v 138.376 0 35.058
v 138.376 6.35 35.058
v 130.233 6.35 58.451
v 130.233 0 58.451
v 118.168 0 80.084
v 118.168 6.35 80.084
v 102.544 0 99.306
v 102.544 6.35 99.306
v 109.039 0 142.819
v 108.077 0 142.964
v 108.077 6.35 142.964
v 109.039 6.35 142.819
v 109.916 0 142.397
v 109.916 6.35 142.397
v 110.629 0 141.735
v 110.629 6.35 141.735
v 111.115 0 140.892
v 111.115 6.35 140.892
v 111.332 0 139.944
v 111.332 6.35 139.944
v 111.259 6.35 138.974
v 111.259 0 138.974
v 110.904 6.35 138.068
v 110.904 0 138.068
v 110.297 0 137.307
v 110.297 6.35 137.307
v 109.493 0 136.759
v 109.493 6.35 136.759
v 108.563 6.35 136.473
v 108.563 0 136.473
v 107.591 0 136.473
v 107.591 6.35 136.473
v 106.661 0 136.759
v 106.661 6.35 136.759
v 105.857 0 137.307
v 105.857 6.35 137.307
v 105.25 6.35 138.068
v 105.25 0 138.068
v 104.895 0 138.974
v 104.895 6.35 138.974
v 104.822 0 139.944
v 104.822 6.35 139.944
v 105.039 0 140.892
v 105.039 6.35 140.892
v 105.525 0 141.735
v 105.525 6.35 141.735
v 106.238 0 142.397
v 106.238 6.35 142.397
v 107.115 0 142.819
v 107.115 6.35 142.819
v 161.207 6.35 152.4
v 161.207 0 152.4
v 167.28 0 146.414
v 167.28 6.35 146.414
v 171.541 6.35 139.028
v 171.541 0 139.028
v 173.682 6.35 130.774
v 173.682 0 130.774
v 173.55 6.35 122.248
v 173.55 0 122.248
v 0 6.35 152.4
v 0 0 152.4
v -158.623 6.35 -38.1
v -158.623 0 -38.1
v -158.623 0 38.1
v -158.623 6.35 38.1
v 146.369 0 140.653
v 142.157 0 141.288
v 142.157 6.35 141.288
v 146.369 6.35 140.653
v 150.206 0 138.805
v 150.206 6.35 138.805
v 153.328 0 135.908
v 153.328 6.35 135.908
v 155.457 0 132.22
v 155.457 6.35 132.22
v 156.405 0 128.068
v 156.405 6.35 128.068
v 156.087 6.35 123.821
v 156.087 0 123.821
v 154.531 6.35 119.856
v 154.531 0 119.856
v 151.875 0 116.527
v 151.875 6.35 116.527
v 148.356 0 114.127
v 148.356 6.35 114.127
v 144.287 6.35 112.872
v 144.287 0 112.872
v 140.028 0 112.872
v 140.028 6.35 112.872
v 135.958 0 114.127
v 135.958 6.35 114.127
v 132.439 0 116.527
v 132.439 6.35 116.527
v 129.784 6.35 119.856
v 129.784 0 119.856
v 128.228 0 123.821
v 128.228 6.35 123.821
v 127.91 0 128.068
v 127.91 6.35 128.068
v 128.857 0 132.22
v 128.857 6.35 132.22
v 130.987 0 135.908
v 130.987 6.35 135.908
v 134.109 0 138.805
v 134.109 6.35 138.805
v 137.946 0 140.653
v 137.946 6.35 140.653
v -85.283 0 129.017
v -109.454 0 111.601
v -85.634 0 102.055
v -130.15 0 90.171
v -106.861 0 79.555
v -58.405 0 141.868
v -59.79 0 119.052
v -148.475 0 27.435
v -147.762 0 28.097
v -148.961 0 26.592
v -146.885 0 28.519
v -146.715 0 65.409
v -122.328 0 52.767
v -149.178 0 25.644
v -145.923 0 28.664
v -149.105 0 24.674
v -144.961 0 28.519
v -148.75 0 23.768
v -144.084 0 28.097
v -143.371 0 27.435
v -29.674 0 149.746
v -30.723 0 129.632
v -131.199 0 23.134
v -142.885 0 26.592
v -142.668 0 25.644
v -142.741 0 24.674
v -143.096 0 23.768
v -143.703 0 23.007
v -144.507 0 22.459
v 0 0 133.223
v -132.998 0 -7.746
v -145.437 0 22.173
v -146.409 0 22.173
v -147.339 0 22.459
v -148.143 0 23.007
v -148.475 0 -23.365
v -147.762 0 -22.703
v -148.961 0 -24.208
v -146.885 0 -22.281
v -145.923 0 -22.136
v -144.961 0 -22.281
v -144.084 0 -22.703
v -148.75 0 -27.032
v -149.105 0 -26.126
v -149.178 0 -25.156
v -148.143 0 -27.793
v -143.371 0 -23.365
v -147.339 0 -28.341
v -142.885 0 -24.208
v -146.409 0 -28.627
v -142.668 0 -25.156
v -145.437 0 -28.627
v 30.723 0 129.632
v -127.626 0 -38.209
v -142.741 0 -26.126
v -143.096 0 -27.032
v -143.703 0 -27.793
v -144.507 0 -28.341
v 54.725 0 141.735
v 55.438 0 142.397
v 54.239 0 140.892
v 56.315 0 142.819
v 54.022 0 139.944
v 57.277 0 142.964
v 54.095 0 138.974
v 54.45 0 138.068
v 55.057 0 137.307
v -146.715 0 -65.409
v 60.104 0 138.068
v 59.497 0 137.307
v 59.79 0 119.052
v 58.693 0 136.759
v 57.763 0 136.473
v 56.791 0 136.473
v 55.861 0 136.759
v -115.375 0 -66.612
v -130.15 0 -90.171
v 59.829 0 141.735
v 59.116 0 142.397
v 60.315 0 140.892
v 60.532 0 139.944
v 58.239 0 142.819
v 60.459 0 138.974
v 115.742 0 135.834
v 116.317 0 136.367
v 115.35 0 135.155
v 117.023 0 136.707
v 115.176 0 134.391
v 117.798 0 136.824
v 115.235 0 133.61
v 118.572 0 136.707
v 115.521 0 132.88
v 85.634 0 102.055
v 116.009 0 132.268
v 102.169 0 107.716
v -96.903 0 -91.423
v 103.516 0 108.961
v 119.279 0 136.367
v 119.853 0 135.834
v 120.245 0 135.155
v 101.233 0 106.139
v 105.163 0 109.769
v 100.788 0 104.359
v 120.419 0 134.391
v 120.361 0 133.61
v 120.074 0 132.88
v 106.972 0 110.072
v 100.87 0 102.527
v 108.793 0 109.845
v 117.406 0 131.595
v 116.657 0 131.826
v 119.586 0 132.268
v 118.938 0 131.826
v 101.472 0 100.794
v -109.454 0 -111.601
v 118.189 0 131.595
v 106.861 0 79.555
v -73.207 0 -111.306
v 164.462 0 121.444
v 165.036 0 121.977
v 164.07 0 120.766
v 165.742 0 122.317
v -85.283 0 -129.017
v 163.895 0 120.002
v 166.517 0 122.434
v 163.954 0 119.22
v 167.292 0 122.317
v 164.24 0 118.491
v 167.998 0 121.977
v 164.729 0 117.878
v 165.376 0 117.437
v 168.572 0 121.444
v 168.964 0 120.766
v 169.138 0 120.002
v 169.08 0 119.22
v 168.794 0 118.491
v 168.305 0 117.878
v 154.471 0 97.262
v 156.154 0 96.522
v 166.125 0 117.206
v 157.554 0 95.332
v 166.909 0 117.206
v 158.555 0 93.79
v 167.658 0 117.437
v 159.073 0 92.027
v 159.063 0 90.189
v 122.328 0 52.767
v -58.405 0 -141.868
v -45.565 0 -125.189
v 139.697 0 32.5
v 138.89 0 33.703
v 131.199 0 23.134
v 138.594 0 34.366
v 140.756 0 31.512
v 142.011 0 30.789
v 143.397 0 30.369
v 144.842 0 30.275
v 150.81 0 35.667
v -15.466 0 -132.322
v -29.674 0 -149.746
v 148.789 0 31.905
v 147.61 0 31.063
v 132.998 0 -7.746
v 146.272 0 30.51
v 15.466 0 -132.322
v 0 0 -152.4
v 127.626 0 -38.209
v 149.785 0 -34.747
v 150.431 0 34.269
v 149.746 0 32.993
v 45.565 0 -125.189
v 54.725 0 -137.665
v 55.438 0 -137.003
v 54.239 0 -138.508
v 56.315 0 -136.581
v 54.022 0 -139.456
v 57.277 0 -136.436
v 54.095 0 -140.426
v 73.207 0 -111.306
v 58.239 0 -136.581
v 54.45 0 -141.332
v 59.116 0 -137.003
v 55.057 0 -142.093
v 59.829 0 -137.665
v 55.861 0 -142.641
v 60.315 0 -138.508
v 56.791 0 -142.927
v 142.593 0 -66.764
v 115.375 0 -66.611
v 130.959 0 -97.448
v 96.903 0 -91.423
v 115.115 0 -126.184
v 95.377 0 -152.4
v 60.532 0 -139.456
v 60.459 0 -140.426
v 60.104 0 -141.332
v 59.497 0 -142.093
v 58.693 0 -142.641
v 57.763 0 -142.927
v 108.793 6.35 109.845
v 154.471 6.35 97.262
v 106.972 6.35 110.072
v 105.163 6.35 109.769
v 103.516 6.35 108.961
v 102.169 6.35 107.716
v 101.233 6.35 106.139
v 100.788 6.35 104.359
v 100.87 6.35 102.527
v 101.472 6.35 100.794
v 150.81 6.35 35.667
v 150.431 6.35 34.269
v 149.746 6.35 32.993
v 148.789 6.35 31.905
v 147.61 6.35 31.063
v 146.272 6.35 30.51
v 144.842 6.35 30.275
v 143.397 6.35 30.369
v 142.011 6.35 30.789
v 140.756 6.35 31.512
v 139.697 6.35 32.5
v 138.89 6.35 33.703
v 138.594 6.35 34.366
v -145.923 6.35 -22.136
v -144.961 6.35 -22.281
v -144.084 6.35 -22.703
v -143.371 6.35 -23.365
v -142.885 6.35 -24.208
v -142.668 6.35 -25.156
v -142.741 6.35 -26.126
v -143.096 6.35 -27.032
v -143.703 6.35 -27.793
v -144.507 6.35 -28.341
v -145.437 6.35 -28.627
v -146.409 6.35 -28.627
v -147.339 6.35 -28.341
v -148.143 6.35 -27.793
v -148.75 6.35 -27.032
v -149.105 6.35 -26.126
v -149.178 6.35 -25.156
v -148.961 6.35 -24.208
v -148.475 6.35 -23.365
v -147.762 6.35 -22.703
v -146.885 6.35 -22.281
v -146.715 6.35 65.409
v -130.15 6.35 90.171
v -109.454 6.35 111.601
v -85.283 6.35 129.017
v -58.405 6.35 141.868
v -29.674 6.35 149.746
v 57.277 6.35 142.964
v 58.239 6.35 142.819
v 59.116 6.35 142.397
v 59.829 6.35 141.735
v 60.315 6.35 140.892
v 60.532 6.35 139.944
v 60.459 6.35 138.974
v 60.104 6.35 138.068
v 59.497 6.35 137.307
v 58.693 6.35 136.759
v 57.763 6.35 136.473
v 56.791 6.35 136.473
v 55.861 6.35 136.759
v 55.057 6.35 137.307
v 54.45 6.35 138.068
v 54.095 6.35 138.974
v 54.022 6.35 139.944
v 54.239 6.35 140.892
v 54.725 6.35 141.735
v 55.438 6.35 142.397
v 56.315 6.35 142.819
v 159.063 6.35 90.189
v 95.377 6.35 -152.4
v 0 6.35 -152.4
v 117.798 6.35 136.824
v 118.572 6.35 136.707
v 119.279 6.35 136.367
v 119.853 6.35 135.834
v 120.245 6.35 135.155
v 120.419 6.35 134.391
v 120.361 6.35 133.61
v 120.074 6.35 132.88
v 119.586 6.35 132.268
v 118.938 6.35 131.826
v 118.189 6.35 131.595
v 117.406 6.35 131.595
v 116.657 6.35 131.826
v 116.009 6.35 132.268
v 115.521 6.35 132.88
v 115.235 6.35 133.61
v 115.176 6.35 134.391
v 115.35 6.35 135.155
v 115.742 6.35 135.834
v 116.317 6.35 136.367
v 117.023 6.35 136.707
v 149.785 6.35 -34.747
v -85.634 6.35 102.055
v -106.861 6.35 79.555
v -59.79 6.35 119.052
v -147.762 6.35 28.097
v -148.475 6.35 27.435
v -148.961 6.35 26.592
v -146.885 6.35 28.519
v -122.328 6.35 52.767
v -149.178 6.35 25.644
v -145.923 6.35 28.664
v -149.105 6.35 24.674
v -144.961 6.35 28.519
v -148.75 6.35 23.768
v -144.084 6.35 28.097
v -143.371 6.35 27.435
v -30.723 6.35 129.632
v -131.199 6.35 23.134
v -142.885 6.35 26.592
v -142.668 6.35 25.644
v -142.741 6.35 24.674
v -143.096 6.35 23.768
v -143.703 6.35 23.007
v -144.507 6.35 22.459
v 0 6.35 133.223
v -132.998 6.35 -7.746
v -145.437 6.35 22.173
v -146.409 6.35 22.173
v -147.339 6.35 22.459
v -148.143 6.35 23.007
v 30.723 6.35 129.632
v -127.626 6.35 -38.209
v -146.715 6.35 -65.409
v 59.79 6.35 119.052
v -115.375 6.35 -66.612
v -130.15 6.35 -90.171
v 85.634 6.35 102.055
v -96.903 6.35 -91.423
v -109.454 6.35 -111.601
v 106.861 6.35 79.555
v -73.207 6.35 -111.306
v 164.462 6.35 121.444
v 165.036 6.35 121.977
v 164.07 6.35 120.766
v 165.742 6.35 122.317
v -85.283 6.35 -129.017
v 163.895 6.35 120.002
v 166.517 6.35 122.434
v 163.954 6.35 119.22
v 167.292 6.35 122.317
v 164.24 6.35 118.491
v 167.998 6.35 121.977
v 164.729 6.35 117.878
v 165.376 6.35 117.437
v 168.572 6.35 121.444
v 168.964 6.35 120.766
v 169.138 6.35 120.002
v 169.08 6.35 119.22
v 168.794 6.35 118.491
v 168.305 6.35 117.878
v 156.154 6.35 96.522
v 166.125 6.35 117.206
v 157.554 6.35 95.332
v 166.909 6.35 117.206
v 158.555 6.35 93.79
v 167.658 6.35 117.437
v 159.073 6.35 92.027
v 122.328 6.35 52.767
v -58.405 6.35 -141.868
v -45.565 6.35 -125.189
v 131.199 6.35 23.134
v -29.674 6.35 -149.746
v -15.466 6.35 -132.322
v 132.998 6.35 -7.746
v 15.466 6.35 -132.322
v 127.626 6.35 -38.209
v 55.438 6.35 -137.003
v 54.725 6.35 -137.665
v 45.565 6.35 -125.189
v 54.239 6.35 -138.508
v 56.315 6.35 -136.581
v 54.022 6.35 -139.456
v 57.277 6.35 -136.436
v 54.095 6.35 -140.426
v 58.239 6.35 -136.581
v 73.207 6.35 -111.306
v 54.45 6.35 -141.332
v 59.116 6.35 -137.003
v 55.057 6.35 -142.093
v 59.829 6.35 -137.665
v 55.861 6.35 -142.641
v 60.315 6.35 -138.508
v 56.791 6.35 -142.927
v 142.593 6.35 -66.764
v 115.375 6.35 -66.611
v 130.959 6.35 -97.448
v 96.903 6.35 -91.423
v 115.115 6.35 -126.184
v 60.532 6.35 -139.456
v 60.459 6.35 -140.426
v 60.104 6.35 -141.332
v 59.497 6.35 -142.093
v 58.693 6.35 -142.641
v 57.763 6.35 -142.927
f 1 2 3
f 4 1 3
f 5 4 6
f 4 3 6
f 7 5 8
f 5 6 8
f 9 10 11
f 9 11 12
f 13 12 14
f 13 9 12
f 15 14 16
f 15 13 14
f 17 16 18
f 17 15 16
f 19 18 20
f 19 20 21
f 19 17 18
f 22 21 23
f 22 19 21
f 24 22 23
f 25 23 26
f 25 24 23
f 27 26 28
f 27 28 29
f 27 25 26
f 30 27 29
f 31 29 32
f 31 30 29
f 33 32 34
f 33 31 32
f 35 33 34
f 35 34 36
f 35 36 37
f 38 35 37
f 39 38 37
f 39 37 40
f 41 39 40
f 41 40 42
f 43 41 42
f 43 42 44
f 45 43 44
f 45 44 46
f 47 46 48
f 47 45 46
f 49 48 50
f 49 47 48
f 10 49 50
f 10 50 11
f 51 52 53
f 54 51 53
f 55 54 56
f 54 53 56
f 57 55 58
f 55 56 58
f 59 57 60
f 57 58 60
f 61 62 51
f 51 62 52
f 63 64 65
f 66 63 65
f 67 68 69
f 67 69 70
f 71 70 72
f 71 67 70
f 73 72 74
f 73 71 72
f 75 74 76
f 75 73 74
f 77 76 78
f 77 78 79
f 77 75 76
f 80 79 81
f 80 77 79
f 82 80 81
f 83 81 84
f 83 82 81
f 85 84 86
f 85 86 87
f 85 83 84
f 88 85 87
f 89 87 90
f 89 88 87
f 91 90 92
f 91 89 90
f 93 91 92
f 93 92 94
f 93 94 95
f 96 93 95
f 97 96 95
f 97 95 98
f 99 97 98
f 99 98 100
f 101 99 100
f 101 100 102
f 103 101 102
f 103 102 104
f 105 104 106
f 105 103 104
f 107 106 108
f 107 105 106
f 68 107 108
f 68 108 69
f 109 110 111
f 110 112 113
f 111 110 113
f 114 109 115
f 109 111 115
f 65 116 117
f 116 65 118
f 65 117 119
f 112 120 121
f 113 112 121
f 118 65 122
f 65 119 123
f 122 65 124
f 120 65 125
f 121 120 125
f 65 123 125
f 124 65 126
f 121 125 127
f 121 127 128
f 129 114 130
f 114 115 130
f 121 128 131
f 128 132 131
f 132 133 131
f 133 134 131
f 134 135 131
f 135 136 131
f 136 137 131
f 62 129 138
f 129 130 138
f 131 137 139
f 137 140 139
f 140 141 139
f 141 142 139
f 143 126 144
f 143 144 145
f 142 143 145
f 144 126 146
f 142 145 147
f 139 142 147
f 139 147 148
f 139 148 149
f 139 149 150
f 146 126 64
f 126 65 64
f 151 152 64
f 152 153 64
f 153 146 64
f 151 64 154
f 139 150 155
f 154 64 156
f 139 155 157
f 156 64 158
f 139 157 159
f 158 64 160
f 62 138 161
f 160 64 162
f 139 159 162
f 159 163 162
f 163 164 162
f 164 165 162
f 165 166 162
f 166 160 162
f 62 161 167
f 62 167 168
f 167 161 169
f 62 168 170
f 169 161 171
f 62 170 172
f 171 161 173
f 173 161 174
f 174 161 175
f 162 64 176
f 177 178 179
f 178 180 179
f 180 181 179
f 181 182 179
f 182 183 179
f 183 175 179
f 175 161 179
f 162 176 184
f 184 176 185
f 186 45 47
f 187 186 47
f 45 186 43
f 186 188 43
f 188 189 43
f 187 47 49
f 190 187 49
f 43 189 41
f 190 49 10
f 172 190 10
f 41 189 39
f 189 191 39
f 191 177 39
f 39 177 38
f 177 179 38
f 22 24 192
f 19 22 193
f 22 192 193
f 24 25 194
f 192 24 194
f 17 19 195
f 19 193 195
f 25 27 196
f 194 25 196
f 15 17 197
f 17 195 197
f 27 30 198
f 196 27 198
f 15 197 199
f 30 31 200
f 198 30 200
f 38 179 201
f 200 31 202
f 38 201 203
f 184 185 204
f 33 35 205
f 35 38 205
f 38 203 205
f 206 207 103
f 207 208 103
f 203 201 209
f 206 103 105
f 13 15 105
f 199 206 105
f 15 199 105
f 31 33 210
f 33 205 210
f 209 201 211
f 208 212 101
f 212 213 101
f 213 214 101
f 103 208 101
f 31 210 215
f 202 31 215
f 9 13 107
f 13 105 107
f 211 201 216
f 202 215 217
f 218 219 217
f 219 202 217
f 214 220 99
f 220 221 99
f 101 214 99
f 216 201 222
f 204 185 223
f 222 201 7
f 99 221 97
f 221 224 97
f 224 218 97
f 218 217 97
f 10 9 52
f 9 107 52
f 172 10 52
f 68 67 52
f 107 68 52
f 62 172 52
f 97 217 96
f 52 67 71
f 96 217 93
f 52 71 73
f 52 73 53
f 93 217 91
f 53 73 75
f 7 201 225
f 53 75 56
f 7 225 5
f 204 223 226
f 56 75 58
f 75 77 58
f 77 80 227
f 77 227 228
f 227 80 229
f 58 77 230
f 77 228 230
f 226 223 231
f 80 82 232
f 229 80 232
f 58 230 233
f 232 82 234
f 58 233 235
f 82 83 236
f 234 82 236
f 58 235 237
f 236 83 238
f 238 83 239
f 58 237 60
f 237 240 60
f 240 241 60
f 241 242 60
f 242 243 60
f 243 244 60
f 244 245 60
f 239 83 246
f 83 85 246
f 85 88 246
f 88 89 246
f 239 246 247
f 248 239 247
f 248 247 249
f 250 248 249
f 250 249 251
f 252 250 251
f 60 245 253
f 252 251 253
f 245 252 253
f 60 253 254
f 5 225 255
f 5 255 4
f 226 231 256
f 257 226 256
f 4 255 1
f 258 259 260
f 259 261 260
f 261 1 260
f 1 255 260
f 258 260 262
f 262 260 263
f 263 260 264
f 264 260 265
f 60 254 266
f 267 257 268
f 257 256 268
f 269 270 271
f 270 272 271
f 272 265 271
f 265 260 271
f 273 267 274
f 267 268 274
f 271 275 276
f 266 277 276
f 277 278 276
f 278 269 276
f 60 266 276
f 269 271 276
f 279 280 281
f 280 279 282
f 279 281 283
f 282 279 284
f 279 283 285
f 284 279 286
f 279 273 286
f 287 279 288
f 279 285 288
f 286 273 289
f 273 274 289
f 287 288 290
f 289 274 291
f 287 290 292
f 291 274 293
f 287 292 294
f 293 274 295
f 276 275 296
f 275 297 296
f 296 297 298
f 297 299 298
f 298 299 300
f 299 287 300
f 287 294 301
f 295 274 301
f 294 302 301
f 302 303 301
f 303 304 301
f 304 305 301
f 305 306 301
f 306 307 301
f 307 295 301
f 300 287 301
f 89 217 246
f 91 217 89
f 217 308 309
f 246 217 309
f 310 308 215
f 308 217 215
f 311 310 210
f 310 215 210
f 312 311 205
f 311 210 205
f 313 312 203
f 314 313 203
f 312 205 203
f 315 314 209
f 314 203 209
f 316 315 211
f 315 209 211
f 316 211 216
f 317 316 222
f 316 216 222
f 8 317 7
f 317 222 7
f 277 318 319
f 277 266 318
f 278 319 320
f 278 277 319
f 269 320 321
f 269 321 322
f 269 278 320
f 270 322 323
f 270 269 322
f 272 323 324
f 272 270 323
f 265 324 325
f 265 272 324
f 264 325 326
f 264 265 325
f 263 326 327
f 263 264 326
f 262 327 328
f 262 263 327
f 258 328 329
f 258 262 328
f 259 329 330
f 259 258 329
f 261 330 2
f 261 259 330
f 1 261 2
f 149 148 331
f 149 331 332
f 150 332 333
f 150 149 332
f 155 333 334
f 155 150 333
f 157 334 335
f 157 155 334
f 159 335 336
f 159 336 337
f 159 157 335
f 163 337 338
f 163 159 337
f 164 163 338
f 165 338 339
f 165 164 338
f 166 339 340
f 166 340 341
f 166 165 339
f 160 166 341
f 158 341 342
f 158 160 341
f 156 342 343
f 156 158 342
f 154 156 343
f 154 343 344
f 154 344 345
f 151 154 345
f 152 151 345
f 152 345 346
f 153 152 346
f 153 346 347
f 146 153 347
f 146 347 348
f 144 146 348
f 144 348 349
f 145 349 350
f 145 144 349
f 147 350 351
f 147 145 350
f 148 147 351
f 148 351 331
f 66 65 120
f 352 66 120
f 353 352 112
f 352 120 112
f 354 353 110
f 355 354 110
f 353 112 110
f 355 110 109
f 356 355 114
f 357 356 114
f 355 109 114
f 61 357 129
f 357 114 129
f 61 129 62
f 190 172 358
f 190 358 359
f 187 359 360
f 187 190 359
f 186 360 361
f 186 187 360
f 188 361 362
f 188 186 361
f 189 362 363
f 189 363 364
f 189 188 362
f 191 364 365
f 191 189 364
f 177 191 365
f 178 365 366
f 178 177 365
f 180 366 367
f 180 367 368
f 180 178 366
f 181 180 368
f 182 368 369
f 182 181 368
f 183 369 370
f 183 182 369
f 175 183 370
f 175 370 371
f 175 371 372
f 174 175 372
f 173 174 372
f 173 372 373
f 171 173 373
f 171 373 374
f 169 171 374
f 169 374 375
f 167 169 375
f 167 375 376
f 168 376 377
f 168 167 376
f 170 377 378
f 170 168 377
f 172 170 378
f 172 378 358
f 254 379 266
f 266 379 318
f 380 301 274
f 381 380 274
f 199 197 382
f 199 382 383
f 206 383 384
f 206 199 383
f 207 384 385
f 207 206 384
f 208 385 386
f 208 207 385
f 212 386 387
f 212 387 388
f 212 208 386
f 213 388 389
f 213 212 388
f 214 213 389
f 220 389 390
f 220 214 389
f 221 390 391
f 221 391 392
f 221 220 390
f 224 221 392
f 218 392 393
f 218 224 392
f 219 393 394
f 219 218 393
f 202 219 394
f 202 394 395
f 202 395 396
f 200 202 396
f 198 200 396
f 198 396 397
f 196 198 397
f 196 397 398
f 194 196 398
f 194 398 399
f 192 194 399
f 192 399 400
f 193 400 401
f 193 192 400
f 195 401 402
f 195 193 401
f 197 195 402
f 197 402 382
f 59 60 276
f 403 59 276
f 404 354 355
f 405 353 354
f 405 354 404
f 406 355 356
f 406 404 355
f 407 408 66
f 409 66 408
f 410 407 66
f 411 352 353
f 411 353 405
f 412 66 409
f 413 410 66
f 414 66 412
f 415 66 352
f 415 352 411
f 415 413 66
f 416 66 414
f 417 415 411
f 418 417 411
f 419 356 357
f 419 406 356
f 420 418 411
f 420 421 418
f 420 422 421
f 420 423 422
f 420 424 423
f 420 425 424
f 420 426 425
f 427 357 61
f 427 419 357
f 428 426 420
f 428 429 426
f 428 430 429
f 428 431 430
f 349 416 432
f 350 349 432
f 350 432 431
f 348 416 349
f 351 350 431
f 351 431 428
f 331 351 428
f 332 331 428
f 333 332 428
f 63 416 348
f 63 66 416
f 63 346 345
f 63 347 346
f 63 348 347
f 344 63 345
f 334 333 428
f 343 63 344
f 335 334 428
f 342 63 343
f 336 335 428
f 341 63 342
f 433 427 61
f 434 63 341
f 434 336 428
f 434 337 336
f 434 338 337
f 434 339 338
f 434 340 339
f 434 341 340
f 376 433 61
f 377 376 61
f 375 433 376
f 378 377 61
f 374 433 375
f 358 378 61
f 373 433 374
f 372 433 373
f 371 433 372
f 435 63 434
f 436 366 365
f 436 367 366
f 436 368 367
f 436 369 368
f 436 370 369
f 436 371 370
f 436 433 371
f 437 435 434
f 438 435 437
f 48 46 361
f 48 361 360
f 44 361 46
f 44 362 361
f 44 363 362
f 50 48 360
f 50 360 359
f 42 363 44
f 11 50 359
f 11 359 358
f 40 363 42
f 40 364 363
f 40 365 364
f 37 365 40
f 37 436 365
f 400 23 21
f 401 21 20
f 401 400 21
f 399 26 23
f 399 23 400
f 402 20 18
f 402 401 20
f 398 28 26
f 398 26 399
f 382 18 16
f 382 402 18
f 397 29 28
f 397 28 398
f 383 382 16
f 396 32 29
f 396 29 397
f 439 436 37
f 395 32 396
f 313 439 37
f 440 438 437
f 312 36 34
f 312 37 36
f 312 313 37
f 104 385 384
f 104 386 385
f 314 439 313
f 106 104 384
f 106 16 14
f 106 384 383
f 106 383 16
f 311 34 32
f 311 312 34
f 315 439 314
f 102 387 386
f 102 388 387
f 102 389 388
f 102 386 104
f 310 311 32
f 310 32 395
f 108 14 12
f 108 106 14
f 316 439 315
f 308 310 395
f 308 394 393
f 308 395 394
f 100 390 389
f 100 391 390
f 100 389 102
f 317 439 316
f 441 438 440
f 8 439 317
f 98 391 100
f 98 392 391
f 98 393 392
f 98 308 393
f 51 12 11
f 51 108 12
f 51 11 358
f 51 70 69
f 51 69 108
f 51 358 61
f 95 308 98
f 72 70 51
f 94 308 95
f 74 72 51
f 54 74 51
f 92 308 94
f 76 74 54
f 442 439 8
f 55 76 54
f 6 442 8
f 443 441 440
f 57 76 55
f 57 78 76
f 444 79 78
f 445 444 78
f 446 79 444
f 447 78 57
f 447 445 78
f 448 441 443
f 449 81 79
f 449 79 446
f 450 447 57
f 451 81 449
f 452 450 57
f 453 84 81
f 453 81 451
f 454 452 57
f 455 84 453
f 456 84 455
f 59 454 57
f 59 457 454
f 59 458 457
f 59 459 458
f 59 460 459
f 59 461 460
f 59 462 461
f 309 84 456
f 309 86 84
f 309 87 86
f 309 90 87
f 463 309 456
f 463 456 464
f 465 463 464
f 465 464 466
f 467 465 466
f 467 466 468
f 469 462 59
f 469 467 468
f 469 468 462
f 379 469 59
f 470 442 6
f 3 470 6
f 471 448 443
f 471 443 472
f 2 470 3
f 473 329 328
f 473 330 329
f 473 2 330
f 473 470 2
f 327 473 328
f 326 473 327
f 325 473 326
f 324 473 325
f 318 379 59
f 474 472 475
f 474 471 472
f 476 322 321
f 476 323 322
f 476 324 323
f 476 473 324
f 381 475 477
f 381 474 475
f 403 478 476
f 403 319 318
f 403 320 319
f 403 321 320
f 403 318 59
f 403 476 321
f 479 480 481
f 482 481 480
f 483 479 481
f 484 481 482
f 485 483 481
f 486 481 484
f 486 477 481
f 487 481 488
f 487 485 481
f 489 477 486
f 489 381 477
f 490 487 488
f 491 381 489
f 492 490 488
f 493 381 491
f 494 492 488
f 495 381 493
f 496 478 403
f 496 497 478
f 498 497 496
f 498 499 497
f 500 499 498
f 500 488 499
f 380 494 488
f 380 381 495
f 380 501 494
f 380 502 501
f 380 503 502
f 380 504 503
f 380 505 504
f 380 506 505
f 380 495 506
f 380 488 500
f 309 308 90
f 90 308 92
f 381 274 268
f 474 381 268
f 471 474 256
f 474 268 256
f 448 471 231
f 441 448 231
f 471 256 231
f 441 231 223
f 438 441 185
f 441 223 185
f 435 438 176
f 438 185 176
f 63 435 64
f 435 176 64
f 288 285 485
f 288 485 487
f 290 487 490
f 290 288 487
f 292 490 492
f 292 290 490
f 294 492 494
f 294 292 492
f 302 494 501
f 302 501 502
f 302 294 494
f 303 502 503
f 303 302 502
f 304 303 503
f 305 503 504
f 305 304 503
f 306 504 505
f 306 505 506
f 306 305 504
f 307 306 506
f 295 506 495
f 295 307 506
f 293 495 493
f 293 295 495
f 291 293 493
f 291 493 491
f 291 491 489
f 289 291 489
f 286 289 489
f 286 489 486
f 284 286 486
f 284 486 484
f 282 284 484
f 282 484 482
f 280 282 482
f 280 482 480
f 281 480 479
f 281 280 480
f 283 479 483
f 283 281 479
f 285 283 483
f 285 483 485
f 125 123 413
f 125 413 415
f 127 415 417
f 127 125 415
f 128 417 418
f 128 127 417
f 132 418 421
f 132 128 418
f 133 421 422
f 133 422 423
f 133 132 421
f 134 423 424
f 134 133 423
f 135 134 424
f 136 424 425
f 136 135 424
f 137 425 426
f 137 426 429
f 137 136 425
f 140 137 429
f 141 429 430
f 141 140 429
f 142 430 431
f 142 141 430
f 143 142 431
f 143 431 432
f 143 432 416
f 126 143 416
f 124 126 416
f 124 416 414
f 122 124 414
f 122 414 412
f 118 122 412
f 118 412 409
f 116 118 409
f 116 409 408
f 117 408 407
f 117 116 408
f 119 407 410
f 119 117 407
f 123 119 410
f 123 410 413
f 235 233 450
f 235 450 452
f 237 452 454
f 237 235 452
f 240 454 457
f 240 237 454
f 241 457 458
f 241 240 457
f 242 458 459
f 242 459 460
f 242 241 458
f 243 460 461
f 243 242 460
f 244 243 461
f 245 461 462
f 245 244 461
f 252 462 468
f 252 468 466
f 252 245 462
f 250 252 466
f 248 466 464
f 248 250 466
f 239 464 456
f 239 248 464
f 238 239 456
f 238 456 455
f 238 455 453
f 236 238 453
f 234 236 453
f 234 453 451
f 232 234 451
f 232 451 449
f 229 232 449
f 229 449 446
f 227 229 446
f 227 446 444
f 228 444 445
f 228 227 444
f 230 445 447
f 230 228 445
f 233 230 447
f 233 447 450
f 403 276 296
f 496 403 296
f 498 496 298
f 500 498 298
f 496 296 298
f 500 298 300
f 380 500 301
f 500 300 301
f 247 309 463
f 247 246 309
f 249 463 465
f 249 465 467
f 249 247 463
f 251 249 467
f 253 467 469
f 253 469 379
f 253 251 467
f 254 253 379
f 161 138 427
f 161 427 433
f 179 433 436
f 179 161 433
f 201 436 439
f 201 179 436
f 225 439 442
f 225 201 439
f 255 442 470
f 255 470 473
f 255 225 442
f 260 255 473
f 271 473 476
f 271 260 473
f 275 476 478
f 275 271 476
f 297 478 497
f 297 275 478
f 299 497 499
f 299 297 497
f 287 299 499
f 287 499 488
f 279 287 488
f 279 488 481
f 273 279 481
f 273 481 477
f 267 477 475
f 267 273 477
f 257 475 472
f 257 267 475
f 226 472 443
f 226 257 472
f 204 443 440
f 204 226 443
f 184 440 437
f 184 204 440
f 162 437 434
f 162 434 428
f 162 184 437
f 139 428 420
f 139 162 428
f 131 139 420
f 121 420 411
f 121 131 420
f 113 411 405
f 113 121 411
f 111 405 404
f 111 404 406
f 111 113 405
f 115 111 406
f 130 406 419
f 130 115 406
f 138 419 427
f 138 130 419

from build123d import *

# Parameters (mm, degrees)
SKETCH1_R           = 3.2639
SKETCH1_R_2         = 133.223
SKETCH1_R_3         = 2.6289
SKETCH1_R_4         = 14.2875
BOSS_EXTRUDE1_DEPTH = 6.35
CUT_EXTRUDE1_DEPTH  = 6.35
FILLET1_R           = 6.35


with BuildPart() as part:
    # Sketch1 → Boss-Extrude1 (new body)
    with BuildSketch(Plane(origin=(0, 0, 0), x_dir=(1, 0, 0), z_dir=(0, 1, 0))):
        with BuildLine():
            Line((95.377, 152.4), (0, 152.4))
            ThreePointArc((0, 152.4), (-97.757028045, 120.848293921), (-158.623, 38.1))
            Line((-158.623, 38.1), (-158.623, -38.1))
            ThreePointArc((-158.623, -38.1), (-97.757028045, -120.848293921), (0, -152.4))
            Line((0, -152.4), (161.207253597, -152.4))
            ThreePointArc((161.207253597, -152.4), (171.540803487, -139.027863312), (173.54963847, -122.24808754))
            Line((173.54963847, -122.24808754), (149.785027389, 34.747190404))
            ThreePointArc((149.785027389, 34.747190404), (130.958683739, 97.447812085), (95.377, 152.4))
        make_face()
        with Locations(Location((108.077, -139.7, 0), (0, 0, 270))):
            Circle(SKETCH1_R, mode=Mode.SUBTRACT)
        with Locations(Location((-145.923, -25.4, 0), (0, 0, 270))):
            Circle(SKETCH1_R, mode=Mode.SUBTRACT)
        with Locations(Location((0, 0, 0), (0, 0, 270))):
            Circle(SKETCH1_R_2, mode=Mode.SUBTRACT)
        with Locations(Location((57.277, -139.7, 0), (0, 0, 270))):
            Circle(SKETCH1_R, mode=Mode.SUBTRACT)
        with Locations(Location((-145.923, 25.4, 0), (0, 0, 270))):
            Circle(SKETCH1_R, mode=Mode.SUBTRACT)
        with Locations(Location((57.277, 139.7, 0), (0, 0, 270))):
            Circle(SKETCH1_R, mode=Mode.SUBTRACT)
        with Locations(Location((166.516908963, -119.805057995, 0), (0, 0, 270))):
            Circle(SKETCH1_R_3, mode=Mode.SUBTRACT)
        with Locations(Location((117.797598231, -134.194942005, 0), (0, 0, 270))):
            Circle(SKETCH1_R_3, mode=Mode.SUBTRACT)
        with Locations(Location((142.157253597, -127, 0), (0, 0, 270))):
            Circle(SKETCH1_R_4, mode=Mode.SUBTRACT)
    extrude(amount=BOSS_EXTRUDE1_DEPTH)

    # Sketch2 → Cut-Extrude1 (cut)
    with BuildSketch(Plane(origin=(0, 6.35, 0), x_dir=(1, 0, 0), z_dir=(0, 1, 0))):
        with BuildLine():
            Line((81.096337026, -117.475), (159.907199476, -95.764025273))
            Line((159.907199476, -95.764025273), (142.748, 17.594164432))
            Line((142.748, 17.594164432), (142.748, 0))
            ThreePointArc((142.748, 0), (126.398835876, -66.33495152), (81.096337026, -117.475))
        make_face()
    extrude(amount=-CUT_EXTRUDE1_DEPTH, mode=Mode.SUBTRACT)

    # Fillet1
    fillet1_edges = [part.edges().sort_by_distance(p)[0] for p in [
        (81.096337026, 3.175, 117.475),
        (142.748, 3.175, -17.594164432),
        (159.907199476, 3.175, 95.764025273),
    ]]
    fillet(fillet1_edges, radius=FILLET1_R)


solid = part.part
